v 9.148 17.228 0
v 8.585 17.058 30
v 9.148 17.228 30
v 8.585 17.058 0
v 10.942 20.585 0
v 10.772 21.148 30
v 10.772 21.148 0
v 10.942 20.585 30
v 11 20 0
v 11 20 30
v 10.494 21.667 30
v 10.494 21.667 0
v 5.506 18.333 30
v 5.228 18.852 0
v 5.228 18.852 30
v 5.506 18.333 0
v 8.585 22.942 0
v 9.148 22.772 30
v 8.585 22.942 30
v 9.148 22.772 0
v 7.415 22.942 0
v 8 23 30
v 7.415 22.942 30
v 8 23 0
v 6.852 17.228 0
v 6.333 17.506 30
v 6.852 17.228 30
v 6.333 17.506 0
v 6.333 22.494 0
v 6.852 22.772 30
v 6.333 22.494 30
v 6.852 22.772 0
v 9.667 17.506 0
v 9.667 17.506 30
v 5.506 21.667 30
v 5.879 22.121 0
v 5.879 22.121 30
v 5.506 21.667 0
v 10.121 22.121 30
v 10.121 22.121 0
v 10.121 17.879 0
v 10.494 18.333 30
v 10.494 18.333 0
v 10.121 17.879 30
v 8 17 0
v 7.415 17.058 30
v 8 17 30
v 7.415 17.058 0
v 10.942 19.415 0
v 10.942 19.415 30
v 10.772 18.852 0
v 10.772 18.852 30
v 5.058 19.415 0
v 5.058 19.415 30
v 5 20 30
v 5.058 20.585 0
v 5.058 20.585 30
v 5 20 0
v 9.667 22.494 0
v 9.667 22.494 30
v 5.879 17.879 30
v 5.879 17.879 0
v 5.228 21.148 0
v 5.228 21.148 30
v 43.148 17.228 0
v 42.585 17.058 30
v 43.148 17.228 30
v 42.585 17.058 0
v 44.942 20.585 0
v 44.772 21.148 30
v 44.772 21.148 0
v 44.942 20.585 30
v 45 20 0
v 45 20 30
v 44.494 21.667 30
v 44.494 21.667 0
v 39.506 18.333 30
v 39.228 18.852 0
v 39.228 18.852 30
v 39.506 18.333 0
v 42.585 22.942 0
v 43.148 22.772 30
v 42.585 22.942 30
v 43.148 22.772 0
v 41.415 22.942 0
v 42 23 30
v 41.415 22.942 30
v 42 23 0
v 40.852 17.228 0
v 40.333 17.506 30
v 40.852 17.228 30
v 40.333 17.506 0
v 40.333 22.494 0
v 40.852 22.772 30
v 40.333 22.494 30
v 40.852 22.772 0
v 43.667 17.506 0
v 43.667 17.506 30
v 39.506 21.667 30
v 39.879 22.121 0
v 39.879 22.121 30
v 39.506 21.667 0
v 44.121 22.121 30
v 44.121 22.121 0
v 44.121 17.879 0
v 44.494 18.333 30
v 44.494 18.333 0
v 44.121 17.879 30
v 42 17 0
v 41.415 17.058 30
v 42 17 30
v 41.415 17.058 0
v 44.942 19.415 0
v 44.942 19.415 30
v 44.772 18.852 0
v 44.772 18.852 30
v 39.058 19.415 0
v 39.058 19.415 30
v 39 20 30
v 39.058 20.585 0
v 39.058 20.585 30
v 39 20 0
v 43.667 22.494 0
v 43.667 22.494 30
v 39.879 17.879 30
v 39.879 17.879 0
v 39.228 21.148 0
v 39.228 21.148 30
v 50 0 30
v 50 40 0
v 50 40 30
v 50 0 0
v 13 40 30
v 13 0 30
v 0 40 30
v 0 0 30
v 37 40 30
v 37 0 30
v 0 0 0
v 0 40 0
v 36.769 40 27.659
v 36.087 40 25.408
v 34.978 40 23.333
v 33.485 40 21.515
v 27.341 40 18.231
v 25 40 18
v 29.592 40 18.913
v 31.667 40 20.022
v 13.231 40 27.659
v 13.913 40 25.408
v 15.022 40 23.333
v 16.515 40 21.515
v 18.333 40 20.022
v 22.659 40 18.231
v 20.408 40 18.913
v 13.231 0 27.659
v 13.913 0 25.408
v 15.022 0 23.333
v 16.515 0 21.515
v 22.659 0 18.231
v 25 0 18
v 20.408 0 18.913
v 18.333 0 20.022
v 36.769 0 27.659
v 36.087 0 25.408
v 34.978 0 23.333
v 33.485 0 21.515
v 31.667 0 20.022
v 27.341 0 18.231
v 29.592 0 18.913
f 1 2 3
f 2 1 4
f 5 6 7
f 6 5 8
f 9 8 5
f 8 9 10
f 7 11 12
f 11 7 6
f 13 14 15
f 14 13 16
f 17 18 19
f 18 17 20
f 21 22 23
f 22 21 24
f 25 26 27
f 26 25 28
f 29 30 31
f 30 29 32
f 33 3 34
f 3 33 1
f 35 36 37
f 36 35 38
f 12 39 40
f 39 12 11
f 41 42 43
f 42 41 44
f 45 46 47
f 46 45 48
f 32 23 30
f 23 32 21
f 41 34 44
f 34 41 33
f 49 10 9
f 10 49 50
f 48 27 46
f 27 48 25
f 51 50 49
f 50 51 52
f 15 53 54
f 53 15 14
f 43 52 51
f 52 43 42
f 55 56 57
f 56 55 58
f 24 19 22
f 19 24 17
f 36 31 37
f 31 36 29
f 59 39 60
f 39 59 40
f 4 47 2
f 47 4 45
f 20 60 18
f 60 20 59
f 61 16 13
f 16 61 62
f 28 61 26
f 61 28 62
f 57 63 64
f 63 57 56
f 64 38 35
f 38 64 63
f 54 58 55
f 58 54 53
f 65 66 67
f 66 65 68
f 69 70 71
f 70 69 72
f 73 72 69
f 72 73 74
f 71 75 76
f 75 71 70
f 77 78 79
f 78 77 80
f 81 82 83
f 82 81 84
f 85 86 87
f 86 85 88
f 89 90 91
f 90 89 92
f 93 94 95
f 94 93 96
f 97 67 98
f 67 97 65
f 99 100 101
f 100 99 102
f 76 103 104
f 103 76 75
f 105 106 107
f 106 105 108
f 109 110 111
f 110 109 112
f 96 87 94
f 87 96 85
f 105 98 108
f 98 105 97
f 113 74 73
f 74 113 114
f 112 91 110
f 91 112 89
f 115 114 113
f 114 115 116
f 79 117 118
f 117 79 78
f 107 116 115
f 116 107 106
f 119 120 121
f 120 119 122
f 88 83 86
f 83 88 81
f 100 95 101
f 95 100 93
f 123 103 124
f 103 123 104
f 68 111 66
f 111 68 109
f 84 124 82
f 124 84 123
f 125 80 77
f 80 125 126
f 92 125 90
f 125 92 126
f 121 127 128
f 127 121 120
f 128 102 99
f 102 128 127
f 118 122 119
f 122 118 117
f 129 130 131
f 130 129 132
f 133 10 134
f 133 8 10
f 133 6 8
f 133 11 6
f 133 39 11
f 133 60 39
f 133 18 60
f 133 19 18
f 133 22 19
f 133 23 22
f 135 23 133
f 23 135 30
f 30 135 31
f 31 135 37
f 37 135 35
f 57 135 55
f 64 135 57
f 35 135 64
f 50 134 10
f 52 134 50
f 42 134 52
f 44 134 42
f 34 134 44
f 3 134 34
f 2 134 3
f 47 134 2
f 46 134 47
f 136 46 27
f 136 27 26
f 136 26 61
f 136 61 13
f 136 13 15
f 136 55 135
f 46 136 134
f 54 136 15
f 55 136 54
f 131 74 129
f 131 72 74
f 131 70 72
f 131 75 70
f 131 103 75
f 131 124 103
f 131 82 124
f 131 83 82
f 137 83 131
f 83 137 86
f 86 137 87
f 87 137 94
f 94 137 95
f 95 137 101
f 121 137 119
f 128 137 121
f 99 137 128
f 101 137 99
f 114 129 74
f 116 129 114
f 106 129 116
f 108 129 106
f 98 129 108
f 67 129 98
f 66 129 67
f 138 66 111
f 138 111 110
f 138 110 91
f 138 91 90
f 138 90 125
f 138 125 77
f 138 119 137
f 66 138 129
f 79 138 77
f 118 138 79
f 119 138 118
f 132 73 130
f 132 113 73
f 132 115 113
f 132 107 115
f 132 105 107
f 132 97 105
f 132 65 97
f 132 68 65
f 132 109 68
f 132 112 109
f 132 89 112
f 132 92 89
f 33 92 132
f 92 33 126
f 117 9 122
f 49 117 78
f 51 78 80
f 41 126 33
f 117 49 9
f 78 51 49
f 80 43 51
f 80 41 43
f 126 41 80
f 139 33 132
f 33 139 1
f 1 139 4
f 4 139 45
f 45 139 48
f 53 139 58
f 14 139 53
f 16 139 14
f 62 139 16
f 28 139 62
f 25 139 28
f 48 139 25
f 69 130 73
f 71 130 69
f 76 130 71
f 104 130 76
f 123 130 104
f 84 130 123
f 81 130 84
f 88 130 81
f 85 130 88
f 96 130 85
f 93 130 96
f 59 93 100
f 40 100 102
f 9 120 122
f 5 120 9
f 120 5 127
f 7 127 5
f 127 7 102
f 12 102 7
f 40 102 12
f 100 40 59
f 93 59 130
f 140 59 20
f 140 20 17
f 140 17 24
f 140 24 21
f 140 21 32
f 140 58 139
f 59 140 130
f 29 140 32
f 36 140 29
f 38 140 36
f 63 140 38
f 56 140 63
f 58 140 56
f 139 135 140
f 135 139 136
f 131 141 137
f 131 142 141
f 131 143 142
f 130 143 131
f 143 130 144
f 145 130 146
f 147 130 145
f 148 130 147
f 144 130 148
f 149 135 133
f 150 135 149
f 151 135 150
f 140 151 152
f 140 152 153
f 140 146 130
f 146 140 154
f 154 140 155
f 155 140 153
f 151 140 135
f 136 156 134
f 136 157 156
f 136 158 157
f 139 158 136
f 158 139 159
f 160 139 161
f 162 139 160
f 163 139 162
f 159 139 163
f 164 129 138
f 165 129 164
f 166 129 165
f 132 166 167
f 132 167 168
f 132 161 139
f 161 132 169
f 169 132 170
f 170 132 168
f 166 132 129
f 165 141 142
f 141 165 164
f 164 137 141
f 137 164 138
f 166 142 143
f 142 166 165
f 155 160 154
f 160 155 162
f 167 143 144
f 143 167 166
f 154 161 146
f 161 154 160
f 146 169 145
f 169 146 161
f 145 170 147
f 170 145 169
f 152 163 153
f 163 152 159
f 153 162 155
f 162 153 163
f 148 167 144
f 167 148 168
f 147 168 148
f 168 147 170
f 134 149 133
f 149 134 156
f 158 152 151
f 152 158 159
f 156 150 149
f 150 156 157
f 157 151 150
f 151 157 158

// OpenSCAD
$fn = 32;

// ----------------------------------------------------------------------
// Saddle clamp: plain shaft clamp
// ----------------------------------------------------------------------

// --- parameters (mm) ---
blk_l = 50;               // block length, X
blk_w = 40;               // block width, Y
blk_h = 30;               // block height
clamp_r = 12;             // shaft groove radius
hole_r = 3;               // bolt hole radius
hole_m = 8;               // bolt hole margin from the ends

saw_depth = clamp_r + 3;  // saw kerf depth

difference() {
  cube([blk_l, blk_w, blk_h]);
  translate([blk_l / 2, -1, blk_h])
    rotate([-90, 0, 0])
      cylinder(h = blk_w + 2, r = clamp_r);
  for (sx = [0, 1])
    translate([sx ? blk_l - hole_m : hole_m, blk_w / 2, -1])
      cylinder(r = hole_r, h = blk_h + 2);
}
